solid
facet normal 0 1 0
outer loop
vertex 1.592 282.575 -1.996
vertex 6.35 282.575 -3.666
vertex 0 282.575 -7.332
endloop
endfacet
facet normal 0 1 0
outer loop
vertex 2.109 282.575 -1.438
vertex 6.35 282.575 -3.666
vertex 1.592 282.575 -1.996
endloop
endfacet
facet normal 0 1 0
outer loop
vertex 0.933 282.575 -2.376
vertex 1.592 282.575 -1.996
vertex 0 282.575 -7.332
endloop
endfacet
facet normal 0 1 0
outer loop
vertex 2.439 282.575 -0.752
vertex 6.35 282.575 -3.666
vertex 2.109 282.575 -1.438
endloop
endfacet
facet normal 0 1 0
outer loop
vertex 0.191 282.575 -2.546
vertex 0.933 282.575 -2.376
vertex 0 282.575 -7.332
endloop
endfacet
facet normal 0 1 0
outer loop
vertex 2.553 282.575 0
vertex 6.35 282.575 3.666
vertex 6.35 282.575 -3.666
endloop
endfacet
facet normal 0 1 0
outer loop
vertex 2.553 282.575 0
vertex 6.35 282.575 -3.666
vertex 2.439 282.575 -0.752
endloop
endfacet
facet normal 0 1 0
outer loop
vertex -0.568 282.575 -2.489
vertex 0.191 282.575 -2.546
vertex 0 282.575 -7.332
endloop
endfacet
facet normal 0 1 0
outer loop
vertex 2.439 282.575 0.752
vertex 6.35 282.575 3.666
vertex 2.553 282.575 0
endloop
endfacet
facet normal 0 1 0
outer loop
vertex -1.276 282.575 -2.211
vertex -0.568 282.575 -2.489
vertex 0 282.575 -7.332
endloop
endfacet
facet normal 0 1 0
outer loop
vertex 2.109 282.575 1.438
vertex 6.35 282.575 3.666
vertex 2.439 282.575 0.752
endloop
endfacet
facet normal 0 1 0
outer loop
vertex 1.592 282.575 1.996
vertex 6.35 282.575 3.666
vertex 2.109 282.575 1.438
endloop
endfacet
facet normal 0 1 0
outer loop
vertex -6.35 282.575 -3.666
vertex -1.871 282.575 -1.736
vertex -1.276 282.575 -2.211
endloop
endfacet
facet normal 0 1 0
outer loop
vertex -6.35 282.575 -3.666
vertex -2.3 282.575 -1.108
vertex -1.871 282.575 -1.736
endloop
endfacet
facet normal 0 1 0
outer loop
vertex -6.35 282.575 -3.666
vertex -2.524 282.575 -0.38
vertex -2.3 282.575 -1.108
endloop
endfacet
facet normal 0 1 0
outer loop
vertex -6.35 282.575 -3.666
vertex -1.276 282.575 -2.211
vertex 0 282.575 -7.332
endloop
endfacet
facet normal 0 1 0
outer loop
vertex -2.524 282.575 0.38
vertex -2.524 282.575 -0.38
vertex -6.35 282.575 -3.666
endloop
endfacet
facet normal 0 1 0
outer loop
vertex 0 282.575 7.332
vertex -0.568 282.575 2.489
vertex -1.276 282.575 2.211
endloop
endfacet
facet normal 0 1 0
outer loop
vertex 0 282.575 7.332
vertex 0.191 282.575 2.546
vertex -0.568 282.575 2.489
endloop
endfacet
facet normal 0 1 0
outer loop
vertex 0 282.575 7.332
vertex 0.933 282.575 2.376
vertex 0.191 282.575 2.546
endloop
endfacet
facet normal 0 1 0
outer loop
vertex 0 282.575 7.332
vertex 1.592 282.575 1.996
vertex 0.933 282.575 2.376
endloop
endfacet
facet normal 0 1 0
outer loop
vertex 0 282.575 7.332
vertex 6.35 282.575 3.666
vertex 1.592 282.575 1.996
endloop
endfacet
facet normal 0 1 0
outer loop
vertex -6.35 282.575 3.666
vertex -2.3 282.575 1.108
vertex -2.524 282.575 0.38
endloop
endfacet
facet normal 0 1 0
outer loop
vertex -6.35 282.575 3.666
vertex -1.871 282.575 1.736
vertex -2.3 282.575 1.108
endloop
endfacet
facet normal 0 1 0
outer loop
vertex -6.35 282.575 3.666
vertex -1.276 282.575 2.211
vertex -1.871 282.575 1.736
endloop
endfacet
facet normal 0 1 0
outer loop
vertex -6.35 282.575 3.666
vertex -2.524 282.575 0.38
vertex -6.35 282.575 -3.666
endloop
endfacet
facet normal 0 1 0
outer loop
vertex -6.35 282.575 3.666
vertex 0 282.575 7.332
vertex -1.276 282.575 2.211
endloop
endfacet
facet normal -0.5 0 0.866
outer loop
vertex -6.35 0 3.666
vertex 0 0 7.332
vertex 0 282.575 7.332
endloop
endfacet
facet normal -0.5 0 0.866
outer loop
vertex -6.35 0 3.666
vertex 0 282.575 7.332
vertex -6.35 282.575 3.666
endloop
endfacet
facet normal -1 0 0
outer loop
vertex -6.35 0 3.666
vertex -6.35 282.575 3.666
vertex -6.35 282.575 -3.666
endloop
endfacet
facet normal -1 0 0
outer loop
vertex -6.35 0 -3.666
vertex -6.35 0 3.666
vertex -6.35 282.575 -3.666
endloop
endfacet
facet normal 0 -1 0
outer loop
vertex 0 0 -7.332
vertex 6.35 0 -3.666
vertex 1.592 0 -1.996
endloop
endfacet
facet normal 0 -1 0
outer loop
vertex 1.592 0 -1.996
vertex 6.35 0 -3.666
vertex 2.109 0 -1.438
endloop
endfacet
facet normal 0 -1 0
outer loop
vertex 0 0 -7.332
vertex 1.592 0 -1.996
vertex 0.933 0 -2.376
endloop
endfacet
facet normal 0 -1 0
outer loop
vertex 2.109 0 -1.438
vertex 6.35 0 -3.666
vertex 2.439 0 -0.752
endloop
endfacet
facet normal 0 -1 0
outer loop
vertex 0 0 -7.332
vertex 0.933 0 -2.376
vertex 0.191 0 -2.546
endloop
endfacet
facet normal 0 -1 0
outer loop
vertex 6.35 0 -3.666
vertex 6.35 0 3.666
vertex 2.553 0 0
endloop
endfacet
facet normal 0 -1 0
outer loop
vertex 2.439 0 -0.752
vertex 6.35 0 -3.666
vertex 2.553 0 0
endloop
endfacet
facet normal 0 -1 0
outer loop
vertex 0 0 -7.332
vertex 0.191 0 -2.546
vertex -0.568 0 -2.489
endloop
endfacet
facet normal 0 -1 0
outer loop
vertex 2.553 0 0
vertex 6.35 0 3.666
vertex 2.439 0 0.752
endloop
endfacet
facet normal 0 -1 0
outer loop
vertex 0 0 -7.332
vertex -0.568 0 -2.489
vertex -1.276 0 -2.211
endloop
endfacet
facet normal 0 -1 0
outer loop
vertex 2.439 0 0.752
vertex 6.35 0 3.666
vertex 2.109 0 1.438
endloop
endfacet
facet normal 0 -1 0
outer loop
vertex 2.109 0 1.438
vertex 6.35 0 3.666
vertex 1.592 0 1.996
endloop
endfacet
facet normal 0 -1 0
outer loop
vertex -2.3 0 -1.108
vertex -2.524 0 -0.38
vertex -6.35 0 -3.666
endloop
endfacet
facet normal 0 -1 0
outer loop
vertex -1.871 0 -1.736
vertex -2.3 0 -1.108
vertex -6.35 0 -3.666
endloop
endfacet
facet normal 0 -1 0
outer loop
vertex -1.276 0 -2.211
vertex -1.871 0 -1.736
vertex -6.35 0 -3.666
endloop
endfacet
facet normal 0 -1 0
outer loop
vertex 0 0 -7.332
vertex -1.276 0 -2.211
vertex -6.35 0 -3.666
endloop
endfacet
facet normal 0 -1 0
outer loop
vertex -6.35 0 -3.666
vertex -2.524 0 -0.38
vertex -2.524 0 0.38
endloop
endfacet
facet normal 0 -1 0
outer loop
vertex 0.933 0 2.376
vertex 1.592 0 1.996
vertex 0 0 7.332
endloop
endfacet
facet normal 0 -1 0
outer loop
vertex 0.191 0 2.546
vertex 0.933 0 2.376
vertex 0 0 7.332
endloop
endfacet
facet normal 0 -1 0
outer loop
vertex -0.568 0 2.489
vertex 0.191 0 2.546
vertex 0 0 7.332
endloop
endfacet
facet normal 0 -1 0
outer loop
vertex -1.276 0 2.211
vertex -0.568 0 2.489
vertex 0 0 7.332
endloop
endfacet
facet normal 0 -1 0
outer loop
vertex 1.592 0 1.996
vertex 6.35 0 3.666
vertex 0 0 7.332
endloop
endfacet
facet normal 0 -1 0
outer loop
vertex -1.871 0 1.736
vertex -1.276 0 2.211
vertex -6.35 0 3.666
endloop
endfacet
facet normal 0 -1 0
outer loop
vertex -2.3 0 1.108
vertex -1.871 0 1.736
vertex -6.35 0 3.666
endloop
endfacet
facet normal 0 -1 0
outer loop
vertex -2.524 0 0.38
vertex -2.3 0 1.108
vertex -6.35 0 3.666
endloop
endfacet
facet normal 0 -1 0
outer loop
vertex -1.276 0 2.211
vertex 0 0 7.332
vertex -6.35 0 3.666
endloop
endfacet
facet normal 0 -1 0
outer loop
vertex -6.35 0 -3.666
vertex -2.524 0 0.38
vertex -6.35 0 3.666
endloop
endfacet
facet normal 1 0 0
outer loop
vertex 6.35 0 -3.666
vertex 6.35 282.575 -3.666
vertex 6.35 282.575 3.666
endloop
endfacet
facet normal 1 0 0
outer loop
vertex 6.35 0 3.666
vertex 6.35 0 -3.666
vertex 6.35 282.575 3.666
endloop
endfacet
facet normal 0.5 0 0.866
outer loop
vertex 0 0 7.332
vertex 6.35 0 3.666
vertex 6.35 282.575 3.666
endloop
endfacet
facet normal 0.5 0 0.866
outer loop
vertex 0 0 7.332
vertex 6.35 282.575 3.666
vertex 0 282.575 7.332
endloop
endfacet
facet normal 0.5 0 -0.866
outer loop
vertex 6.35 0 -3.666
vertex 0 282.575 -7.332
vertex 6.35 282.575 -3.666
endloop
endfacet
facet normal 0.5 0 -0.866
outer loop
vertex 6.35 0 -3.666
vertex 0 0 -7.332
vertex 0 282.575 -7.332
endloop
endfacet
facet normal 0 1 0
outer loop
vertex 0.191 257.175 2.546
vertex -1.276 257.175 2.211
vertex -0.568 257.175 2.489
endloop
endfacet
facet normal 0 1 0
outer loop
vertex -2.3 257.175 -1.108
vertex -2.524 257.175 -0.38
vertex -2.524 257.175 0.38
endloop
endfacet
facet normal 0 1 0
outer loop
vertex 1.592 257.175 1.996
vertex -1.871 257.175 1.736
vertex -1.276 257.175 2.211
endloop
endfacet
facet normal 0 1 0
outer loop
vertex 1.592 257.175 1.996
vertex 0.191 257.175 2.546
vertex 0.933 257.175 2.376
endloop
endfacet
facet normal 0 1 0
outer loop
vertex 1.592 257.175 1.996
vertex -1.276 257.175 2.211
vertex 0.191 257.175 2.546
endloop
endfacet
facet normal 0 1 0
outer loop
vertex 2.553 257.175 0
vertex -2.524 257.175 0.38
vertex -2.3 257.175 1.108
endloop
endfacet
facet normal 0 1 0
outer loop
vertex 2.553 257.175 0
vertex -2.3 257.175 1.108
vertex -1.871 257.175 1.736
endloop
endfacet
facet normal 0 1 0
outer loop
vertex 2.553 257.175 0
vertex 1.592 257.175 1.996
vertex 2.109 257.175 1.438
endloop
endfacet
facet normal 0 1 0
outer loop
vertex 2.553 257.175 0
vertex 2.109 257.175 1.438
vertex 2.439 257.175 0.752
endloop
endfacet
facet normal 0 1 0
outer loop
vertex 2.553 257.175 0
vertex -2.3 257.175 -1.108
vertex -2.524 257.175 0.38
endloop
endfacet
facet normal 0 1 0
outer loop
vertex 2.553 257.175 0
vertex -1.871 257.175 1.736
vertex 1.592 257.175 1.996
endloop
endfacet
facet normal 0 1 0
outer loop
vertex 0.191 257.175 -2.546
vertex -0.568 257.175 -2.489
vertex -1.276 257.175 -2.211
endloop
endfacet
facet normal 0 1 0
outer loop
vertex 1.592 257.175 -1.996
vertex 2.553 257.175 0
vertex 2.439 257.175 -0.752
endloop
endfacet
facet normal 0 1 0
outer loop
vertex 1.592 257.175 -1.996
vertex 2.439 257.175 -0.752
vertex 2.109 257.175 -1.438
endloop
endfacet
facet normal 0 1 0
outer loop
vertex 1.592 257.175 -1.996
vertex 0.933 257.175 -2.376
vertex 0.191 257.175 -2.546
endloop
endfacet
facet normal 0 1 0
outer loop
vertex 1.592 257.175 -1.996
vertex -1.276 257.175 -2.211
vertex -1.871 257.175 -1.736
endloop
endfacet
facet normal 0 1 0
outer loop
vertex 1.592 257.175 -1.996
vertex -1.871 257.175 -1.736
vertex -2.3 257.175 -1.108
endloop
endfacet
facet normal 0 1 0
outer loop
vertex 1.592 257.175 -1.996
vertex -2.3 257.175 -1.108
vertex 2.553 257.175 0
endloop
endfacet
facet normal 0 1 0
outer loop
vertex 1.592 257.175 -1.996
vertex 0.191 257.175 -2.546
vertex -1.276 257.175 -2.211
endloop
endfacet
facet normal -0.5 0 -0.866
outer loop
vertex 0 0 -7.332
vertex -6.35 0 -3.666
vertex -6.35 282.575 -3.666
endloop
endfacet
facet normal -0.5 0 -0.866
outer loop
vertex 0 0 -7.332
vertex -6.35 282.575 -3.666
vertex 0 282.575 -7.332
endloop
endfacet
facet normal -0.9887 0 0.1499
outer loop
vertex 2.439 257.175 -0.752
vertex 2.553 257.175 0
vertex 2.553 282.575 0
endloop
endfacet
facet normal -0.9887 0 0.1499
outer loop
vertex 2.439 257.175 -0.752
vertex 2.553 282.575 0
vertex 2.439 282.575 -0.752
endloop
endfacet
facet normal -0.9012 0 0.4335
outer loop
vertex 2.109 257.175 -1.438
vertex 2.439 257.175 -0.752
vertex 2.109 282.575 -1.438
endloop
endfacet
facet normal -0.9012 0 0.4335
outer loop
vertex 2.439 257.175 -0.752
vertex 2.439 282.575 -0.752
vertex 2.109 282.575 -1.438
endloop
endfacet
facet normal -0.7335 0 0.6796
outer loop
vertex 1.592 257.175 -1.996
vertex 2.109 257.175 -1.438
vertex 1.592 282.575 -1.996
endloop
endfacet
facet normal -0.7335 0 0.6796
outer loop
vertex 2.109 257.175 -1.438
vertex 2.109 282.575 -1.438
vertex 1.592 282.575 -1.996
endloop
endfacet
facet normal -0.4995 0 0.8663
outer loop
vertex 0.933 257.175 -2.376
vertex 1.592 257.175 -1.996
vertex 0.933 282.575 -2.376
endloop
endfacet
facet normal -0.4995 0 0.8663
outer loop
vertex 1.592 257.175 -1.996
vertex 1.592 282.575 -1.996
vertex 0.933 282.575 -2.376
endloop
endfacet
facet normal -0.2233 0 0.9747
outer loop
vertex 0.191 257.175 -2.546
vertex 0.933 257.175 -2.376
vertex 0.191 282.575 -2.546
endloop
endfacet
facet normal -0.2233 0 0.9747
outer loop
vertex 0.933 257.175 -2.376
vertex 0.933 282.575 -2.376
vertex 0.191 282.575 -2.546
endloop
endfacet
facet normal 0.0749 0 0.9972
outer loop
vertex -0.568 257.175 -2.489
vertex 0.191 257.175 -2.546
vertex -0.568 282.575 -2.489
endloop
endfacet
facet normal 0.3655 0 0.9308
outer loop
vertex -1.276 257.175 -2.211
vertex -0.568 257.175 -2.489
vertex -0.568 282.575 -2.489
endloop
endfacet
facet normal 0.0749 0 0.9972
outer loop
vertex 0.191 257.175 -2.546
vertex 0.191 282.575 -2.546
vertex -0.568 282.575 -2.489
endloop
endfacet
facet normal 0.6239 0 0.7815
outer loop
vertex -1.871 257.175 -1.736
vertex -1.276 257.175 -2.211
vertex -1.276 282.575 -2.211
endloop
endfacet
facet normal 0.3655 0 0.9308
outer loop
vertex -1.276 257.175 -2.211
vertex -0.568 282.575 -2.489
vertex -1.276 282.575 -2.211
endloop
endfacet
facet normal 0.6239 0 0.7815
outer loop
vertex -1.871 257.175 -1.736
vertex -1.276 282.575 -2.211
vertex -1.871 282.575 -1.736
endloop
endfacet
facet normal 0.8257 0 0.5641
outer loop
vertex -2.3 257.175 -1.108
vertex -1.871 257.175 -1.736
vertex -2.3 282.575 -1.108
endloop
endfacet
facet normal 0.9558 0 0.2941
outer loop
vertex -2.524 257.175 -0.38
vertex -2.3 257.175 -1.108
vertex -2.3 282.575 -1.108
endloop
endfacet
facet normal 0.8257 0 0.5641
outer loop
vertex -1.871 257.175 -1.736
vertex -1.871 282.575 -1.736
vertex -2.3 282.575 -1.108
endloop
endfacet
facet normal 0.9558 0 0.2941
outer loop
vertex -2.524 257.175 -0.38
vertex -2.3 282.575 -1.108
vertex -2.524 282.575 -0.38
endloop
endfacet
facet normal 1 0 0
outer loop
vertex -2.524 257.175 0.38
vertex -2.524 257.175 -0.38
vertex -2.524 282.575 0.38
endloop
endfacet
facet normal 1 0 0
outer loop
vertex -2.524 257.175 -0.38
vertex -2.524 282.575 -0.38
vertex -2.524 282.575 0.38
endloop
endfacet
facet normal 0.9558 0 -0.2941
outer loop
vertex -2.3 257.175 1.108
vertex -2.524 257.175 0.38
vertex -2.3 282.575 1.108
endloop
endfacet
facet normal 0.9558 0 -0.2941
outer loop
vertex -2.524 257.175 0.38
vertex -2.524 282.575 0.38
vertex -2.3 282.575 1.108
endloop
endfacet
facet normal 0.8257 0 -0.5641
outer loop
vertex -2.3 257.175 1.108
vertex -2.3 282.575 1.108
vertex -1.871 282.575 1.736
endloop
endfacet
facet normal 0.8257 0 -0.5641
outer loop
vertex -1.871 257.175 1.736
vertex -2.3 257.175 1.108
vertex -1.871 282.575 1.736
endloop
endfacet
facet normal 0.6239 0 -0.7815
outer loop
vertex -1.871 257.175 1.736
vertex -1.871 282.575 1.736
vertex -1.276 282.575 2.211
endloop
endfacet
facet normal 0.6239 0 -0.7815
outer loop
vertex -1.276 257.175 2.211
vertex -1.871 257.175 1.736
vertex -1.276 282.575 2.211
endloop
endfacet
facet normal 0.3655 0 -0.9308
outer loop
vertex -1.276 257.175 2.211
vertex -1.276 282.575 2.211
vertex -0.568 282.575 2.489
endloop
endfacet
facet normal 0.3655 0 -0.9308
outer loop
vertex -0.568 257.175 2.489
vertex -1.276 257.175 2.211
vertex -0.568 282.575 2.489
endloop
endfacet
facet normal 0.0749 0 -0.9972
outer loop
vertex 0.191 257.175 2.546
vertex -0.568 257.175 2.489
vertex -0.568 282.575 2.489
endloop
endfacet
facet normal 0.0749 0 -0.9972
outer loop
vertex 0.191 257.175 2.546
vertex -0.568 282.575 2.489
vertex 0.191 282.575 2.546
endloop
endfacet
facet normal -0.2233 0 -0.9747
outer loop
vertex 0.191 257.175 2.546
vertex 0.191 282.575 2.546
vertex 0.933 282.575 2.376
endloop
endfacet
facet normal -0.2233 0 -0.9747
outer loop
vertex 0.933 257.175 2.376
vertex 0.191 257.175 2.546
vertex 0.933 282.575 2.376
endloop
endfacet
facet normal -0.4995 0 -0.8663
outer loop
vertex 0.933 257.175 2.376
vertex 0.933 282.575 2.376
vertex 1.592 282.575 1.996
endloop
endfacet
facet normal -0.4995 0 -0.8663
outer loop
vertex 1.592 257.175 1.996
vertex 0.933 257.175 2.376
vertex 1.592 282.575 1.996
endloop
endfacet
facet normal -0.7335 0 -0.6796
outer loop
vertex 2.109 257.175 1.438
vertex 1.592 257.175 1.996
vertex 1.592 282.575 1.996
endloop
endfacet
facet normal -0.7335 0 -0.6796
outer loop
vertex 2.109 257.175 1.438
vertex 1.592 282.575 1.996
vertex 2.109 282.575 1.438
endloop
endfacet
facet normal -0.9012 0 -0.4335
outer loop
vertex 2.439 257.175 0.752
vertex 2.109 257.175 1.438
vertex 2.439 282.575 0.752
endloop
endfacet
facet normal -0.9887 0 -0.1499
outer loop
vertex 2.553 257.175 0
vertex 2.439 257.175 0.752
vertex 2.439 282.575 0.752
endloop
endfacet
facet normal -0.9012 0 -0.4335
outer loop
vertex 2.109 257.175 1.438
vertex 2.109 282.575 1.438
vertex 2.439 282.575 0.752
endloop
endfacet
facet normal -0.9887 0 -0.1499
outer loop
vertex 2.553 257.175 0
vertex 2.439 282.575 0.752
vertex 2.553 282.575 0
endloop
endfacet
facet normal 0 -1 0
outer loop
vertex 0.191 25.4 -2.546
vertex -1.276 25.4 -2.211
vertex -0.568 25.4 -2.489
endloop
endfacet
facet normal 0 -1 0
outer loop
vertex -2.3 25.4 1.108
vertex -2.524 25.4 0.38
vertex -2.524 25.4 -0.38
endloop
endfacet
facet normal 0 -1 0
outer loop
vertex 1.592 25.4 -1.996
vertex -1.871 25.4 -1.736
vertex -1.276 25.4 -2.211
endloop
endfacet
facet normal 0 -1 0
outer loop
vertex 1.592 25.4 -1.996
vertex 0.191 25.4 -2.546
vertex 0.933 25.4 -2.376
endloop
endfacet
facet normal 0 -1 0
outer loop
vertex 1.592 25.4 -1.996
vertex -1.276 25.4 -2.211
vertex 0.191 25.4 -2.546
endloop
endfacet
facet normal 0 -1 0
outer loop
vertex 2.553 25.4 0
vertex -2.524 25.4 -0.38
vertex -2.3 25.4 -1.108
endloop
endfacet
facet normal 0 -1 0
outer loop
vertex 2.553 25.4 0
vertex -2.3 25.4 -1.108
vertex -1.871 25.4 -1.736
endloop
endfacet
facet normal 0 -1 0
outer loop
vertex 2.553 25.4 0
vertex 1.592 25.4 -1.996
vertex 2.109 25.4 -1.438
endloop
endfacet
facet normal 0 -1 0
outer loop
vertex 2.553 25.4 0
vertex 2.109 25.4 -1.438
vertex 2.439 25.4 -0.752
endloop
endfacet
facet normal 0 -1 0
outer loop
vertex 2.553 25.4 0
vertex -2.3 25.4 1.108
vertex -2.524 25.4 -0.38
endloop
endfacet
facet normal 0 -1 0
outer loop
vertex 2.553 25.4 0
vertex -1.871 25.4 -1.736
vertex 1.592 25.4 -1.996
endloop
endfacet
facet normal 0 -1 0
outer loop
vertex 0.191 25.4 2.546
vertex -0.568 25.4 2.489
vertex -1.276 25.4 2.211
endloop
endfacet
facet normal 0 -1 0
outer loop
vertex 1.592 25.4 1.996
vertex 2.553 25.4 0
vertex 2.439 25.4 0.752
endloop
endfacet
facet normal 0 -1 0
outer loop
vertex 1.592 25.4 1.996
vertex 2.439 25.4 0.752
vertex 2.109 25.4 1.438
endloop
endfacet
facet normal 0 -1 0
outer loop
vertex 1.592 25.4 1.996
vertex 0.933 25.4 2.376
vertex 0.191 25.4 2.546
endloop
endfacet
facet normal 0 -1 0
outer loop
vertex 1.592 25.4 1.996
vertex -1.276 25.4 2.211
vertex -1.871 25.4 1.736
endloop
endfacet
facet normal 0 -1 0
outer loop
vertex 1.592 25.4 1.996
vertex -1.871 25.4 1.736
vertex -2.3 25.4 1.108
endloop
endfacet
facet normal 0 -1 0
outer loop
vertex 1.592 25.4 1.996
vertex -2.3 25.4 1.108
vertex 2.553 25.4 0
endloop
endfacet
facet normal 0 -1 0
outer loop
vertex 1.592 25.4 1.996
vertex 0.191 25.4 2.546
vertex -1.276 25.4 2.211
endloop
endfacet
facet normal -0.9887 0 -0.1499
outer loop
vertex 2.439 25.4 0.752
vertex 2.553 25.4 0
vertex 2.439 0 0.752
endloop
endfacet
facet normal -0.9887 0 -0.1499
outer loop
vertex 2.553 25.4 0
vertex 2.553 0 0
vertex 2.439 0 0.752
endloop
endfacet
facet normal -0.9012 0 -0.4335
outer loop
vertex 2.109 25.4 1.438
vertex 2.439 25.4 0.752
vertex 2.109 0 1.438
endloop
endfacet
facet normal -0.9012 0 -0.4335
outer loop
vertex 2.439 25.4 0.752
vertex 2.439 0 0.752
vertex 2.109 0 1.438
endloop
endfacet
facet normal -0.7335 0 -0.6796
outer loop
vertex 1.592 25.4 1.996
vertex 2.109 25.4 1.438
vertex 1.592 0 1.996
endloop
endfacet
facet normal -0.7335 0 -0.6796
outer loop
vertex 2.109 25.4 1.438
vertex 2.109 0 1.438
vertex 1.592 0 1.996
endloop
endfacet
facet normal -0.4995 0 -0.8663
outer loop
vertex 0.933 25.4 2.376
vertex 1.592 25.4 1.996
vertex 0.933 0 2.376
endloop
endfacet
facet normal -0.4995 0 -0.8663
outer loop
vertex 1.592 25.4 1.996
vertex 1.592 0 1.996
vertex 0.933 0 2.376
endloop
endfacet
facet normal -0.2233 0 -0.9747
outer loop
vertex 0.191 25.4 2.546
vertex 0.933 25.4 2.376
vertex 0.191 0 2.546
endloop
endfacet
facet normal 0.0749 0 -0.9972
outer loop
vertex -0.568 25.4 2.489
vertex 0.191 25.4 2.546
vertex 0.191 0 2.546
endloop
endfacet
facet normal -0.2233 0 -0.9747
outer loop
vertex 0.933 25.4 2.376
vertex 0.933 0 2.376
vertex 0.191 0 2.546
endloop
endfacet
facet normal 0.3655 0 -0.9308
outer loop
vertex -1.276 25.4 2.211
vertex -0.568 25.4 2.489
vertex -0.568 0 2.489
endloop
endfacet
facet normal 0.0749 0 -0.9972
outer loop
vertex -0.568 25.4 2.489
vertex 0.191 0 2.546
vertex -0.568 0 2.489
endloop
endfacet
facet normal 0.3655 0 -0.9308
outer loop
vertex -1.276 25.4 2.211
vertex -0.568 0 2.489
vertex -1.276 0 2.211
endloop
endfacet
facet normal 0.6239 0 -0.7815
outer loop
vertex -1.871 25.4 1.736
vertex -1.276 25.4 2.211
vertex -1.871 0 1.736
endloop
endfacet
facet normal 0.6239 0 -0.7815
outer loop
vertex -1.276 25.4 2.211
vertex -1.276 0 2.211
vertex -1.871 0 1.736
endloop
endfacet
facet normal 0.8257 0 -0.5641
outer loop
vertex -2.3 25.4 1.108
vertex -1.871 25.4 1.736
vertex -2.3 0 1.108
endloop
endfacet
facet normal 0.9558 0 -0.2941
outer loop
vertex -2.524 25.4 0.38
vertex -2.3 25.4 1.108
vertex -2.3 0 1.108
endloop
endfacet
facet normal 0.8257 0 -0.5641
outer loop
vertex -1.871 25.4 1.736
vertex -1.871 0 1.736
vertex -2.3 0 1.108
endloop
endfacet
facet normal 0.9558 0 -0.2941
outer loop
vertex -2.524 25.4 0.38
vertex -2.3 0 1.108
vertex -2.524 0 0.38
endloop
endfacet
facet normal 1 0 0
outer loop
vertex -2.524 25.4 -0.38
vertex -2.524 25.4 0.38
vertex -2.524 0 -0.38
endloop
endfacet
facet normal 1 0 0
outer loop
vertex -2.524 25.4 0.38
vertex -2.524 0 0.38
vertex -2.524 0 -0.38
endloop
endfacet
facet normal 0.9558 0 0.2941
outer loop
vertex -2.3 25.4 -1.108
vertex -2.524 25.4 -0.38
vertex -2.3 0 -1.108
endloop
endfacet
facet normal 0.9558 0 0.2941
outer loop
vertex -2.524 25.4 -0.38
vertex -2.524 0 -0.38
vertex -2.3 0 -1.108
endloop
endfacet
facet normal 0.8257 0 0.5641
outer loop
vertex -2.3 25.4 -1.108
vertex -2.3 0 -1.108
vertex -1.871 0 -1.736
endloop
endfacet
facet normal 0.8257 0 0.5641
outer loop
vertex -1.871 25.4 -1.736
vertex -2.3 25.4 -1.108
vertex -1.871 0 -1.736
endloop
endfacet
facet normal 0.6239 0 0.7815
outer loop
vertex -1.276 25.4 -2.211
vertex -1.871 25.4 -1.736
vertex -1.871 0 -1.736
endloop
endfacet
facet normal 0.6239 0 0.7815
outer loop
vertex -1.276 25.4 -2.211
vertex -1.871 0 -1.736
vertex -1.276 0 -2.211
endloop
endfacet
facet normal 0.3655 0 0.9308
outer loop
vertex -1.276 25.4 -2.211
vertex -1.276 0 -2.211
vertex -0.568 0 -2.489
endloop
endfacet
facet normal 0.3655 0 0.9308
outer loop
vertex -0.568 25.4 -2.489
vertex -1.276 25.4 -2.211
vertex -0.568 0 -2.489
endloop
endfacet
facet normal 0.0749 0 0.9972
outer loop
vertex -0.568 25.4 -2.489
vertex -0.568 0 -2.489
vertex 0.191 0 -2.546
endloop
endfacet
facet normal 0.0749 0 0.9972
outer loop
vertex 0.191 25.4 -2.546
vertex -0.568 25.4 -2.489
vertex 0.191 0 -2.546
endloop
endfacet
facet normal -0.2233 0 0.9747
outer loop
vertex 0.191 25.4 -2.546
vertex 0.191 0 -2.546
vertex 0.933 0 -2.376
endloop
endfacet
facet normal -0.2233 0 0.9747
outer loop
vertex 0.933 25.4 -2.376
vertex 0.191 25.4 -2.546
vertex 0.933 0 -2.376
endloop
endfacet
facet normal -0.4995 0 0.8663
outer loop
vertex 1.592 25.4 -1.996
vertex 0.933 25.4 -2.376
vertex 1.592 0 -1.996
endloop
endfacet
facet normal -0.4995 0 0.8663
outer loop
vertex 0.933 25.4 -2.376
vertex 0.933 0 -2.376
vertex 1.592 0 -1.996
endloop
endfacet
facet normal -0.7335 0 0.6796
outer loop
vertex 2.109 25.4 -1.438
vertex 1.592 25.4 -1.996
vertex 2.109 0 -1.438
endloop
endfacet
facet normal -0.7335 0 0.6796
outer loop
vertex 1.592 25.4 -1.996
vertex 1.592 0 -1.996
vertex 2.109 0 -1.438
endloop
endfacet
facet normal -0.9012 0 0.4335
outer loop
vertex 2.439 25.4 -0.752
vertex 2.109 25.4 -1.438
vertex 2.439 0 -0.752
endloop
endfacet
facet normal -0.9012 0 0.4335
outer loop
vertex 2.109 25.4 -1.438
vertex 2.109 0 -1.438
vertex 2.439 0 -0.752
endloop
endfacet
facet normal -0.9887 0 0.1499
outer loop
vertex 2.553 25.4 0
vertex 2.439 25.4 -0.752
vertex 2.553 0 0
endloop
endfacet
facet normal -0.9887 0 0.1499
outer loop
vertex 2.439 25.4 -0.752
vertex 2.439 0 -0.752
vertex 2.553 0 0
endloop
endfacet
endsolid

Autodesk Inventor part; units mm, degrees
ref_plane "YZ Plane" through (0, 0, 0) normal (1, 0, 0) x (0, 1, 0)
ref_plane "XZ Plane" through (0, 0, 0) normal (0, 1, 0) x (-1, 0, 0)
ref_plane "XY Plane" through (0, 0, 0) normal (0, 0, 1) x (1, 0, 0)
sketch "Sketch1" plane through (0, 0, 0) normal (0, 1, 0) x (-1, 0, 0)
  line L0 (-6.35, -3.6662) -> (-6.35, 3.6662)
  line L1 (-6.35, 3.6662) -> (0, 7.3323)
  line L2 (0, 7.3323) -> (6.35, 3.6662)
  line L3 (6.35, 3.6662) -> (6.35, -3.6662)
  line L4 (6.35, -3.6662) -> (0, -7.3323)
  line L5 (0, -7.3323) -> (-6.35, -3.6662)
  point P0 (0, 0)
  point P1 (0, 0)
  dimension "d0" = 12.7
extrude "Extrusion1" add sketch "Sketch1" along normal blind 282.575
sketch "Sketch2" plane through (0, 282.575, 0) normal (0, 1, 0) x (1, 0, 0)
  circle A0 centre (0, 0) radius 2.5527
  dimension "d4" = 5.1054
extrude "Extrusion2" cut sketch "Sketch2" against normal blind 25.4
sketch "Sketch3" plane through (0, 0, 0) normal (0, -1, 0) x (1, 0, 0)
  circle A0 centre (0, 0) radius 2.5527
  dimension "d7" = 5.1054
extrude "Extrusion3" cut sketch "Sketch3" against normal blind 25.4
properties part number "INDX_018_FeedFrontHex" material "Aluminum 6061"
